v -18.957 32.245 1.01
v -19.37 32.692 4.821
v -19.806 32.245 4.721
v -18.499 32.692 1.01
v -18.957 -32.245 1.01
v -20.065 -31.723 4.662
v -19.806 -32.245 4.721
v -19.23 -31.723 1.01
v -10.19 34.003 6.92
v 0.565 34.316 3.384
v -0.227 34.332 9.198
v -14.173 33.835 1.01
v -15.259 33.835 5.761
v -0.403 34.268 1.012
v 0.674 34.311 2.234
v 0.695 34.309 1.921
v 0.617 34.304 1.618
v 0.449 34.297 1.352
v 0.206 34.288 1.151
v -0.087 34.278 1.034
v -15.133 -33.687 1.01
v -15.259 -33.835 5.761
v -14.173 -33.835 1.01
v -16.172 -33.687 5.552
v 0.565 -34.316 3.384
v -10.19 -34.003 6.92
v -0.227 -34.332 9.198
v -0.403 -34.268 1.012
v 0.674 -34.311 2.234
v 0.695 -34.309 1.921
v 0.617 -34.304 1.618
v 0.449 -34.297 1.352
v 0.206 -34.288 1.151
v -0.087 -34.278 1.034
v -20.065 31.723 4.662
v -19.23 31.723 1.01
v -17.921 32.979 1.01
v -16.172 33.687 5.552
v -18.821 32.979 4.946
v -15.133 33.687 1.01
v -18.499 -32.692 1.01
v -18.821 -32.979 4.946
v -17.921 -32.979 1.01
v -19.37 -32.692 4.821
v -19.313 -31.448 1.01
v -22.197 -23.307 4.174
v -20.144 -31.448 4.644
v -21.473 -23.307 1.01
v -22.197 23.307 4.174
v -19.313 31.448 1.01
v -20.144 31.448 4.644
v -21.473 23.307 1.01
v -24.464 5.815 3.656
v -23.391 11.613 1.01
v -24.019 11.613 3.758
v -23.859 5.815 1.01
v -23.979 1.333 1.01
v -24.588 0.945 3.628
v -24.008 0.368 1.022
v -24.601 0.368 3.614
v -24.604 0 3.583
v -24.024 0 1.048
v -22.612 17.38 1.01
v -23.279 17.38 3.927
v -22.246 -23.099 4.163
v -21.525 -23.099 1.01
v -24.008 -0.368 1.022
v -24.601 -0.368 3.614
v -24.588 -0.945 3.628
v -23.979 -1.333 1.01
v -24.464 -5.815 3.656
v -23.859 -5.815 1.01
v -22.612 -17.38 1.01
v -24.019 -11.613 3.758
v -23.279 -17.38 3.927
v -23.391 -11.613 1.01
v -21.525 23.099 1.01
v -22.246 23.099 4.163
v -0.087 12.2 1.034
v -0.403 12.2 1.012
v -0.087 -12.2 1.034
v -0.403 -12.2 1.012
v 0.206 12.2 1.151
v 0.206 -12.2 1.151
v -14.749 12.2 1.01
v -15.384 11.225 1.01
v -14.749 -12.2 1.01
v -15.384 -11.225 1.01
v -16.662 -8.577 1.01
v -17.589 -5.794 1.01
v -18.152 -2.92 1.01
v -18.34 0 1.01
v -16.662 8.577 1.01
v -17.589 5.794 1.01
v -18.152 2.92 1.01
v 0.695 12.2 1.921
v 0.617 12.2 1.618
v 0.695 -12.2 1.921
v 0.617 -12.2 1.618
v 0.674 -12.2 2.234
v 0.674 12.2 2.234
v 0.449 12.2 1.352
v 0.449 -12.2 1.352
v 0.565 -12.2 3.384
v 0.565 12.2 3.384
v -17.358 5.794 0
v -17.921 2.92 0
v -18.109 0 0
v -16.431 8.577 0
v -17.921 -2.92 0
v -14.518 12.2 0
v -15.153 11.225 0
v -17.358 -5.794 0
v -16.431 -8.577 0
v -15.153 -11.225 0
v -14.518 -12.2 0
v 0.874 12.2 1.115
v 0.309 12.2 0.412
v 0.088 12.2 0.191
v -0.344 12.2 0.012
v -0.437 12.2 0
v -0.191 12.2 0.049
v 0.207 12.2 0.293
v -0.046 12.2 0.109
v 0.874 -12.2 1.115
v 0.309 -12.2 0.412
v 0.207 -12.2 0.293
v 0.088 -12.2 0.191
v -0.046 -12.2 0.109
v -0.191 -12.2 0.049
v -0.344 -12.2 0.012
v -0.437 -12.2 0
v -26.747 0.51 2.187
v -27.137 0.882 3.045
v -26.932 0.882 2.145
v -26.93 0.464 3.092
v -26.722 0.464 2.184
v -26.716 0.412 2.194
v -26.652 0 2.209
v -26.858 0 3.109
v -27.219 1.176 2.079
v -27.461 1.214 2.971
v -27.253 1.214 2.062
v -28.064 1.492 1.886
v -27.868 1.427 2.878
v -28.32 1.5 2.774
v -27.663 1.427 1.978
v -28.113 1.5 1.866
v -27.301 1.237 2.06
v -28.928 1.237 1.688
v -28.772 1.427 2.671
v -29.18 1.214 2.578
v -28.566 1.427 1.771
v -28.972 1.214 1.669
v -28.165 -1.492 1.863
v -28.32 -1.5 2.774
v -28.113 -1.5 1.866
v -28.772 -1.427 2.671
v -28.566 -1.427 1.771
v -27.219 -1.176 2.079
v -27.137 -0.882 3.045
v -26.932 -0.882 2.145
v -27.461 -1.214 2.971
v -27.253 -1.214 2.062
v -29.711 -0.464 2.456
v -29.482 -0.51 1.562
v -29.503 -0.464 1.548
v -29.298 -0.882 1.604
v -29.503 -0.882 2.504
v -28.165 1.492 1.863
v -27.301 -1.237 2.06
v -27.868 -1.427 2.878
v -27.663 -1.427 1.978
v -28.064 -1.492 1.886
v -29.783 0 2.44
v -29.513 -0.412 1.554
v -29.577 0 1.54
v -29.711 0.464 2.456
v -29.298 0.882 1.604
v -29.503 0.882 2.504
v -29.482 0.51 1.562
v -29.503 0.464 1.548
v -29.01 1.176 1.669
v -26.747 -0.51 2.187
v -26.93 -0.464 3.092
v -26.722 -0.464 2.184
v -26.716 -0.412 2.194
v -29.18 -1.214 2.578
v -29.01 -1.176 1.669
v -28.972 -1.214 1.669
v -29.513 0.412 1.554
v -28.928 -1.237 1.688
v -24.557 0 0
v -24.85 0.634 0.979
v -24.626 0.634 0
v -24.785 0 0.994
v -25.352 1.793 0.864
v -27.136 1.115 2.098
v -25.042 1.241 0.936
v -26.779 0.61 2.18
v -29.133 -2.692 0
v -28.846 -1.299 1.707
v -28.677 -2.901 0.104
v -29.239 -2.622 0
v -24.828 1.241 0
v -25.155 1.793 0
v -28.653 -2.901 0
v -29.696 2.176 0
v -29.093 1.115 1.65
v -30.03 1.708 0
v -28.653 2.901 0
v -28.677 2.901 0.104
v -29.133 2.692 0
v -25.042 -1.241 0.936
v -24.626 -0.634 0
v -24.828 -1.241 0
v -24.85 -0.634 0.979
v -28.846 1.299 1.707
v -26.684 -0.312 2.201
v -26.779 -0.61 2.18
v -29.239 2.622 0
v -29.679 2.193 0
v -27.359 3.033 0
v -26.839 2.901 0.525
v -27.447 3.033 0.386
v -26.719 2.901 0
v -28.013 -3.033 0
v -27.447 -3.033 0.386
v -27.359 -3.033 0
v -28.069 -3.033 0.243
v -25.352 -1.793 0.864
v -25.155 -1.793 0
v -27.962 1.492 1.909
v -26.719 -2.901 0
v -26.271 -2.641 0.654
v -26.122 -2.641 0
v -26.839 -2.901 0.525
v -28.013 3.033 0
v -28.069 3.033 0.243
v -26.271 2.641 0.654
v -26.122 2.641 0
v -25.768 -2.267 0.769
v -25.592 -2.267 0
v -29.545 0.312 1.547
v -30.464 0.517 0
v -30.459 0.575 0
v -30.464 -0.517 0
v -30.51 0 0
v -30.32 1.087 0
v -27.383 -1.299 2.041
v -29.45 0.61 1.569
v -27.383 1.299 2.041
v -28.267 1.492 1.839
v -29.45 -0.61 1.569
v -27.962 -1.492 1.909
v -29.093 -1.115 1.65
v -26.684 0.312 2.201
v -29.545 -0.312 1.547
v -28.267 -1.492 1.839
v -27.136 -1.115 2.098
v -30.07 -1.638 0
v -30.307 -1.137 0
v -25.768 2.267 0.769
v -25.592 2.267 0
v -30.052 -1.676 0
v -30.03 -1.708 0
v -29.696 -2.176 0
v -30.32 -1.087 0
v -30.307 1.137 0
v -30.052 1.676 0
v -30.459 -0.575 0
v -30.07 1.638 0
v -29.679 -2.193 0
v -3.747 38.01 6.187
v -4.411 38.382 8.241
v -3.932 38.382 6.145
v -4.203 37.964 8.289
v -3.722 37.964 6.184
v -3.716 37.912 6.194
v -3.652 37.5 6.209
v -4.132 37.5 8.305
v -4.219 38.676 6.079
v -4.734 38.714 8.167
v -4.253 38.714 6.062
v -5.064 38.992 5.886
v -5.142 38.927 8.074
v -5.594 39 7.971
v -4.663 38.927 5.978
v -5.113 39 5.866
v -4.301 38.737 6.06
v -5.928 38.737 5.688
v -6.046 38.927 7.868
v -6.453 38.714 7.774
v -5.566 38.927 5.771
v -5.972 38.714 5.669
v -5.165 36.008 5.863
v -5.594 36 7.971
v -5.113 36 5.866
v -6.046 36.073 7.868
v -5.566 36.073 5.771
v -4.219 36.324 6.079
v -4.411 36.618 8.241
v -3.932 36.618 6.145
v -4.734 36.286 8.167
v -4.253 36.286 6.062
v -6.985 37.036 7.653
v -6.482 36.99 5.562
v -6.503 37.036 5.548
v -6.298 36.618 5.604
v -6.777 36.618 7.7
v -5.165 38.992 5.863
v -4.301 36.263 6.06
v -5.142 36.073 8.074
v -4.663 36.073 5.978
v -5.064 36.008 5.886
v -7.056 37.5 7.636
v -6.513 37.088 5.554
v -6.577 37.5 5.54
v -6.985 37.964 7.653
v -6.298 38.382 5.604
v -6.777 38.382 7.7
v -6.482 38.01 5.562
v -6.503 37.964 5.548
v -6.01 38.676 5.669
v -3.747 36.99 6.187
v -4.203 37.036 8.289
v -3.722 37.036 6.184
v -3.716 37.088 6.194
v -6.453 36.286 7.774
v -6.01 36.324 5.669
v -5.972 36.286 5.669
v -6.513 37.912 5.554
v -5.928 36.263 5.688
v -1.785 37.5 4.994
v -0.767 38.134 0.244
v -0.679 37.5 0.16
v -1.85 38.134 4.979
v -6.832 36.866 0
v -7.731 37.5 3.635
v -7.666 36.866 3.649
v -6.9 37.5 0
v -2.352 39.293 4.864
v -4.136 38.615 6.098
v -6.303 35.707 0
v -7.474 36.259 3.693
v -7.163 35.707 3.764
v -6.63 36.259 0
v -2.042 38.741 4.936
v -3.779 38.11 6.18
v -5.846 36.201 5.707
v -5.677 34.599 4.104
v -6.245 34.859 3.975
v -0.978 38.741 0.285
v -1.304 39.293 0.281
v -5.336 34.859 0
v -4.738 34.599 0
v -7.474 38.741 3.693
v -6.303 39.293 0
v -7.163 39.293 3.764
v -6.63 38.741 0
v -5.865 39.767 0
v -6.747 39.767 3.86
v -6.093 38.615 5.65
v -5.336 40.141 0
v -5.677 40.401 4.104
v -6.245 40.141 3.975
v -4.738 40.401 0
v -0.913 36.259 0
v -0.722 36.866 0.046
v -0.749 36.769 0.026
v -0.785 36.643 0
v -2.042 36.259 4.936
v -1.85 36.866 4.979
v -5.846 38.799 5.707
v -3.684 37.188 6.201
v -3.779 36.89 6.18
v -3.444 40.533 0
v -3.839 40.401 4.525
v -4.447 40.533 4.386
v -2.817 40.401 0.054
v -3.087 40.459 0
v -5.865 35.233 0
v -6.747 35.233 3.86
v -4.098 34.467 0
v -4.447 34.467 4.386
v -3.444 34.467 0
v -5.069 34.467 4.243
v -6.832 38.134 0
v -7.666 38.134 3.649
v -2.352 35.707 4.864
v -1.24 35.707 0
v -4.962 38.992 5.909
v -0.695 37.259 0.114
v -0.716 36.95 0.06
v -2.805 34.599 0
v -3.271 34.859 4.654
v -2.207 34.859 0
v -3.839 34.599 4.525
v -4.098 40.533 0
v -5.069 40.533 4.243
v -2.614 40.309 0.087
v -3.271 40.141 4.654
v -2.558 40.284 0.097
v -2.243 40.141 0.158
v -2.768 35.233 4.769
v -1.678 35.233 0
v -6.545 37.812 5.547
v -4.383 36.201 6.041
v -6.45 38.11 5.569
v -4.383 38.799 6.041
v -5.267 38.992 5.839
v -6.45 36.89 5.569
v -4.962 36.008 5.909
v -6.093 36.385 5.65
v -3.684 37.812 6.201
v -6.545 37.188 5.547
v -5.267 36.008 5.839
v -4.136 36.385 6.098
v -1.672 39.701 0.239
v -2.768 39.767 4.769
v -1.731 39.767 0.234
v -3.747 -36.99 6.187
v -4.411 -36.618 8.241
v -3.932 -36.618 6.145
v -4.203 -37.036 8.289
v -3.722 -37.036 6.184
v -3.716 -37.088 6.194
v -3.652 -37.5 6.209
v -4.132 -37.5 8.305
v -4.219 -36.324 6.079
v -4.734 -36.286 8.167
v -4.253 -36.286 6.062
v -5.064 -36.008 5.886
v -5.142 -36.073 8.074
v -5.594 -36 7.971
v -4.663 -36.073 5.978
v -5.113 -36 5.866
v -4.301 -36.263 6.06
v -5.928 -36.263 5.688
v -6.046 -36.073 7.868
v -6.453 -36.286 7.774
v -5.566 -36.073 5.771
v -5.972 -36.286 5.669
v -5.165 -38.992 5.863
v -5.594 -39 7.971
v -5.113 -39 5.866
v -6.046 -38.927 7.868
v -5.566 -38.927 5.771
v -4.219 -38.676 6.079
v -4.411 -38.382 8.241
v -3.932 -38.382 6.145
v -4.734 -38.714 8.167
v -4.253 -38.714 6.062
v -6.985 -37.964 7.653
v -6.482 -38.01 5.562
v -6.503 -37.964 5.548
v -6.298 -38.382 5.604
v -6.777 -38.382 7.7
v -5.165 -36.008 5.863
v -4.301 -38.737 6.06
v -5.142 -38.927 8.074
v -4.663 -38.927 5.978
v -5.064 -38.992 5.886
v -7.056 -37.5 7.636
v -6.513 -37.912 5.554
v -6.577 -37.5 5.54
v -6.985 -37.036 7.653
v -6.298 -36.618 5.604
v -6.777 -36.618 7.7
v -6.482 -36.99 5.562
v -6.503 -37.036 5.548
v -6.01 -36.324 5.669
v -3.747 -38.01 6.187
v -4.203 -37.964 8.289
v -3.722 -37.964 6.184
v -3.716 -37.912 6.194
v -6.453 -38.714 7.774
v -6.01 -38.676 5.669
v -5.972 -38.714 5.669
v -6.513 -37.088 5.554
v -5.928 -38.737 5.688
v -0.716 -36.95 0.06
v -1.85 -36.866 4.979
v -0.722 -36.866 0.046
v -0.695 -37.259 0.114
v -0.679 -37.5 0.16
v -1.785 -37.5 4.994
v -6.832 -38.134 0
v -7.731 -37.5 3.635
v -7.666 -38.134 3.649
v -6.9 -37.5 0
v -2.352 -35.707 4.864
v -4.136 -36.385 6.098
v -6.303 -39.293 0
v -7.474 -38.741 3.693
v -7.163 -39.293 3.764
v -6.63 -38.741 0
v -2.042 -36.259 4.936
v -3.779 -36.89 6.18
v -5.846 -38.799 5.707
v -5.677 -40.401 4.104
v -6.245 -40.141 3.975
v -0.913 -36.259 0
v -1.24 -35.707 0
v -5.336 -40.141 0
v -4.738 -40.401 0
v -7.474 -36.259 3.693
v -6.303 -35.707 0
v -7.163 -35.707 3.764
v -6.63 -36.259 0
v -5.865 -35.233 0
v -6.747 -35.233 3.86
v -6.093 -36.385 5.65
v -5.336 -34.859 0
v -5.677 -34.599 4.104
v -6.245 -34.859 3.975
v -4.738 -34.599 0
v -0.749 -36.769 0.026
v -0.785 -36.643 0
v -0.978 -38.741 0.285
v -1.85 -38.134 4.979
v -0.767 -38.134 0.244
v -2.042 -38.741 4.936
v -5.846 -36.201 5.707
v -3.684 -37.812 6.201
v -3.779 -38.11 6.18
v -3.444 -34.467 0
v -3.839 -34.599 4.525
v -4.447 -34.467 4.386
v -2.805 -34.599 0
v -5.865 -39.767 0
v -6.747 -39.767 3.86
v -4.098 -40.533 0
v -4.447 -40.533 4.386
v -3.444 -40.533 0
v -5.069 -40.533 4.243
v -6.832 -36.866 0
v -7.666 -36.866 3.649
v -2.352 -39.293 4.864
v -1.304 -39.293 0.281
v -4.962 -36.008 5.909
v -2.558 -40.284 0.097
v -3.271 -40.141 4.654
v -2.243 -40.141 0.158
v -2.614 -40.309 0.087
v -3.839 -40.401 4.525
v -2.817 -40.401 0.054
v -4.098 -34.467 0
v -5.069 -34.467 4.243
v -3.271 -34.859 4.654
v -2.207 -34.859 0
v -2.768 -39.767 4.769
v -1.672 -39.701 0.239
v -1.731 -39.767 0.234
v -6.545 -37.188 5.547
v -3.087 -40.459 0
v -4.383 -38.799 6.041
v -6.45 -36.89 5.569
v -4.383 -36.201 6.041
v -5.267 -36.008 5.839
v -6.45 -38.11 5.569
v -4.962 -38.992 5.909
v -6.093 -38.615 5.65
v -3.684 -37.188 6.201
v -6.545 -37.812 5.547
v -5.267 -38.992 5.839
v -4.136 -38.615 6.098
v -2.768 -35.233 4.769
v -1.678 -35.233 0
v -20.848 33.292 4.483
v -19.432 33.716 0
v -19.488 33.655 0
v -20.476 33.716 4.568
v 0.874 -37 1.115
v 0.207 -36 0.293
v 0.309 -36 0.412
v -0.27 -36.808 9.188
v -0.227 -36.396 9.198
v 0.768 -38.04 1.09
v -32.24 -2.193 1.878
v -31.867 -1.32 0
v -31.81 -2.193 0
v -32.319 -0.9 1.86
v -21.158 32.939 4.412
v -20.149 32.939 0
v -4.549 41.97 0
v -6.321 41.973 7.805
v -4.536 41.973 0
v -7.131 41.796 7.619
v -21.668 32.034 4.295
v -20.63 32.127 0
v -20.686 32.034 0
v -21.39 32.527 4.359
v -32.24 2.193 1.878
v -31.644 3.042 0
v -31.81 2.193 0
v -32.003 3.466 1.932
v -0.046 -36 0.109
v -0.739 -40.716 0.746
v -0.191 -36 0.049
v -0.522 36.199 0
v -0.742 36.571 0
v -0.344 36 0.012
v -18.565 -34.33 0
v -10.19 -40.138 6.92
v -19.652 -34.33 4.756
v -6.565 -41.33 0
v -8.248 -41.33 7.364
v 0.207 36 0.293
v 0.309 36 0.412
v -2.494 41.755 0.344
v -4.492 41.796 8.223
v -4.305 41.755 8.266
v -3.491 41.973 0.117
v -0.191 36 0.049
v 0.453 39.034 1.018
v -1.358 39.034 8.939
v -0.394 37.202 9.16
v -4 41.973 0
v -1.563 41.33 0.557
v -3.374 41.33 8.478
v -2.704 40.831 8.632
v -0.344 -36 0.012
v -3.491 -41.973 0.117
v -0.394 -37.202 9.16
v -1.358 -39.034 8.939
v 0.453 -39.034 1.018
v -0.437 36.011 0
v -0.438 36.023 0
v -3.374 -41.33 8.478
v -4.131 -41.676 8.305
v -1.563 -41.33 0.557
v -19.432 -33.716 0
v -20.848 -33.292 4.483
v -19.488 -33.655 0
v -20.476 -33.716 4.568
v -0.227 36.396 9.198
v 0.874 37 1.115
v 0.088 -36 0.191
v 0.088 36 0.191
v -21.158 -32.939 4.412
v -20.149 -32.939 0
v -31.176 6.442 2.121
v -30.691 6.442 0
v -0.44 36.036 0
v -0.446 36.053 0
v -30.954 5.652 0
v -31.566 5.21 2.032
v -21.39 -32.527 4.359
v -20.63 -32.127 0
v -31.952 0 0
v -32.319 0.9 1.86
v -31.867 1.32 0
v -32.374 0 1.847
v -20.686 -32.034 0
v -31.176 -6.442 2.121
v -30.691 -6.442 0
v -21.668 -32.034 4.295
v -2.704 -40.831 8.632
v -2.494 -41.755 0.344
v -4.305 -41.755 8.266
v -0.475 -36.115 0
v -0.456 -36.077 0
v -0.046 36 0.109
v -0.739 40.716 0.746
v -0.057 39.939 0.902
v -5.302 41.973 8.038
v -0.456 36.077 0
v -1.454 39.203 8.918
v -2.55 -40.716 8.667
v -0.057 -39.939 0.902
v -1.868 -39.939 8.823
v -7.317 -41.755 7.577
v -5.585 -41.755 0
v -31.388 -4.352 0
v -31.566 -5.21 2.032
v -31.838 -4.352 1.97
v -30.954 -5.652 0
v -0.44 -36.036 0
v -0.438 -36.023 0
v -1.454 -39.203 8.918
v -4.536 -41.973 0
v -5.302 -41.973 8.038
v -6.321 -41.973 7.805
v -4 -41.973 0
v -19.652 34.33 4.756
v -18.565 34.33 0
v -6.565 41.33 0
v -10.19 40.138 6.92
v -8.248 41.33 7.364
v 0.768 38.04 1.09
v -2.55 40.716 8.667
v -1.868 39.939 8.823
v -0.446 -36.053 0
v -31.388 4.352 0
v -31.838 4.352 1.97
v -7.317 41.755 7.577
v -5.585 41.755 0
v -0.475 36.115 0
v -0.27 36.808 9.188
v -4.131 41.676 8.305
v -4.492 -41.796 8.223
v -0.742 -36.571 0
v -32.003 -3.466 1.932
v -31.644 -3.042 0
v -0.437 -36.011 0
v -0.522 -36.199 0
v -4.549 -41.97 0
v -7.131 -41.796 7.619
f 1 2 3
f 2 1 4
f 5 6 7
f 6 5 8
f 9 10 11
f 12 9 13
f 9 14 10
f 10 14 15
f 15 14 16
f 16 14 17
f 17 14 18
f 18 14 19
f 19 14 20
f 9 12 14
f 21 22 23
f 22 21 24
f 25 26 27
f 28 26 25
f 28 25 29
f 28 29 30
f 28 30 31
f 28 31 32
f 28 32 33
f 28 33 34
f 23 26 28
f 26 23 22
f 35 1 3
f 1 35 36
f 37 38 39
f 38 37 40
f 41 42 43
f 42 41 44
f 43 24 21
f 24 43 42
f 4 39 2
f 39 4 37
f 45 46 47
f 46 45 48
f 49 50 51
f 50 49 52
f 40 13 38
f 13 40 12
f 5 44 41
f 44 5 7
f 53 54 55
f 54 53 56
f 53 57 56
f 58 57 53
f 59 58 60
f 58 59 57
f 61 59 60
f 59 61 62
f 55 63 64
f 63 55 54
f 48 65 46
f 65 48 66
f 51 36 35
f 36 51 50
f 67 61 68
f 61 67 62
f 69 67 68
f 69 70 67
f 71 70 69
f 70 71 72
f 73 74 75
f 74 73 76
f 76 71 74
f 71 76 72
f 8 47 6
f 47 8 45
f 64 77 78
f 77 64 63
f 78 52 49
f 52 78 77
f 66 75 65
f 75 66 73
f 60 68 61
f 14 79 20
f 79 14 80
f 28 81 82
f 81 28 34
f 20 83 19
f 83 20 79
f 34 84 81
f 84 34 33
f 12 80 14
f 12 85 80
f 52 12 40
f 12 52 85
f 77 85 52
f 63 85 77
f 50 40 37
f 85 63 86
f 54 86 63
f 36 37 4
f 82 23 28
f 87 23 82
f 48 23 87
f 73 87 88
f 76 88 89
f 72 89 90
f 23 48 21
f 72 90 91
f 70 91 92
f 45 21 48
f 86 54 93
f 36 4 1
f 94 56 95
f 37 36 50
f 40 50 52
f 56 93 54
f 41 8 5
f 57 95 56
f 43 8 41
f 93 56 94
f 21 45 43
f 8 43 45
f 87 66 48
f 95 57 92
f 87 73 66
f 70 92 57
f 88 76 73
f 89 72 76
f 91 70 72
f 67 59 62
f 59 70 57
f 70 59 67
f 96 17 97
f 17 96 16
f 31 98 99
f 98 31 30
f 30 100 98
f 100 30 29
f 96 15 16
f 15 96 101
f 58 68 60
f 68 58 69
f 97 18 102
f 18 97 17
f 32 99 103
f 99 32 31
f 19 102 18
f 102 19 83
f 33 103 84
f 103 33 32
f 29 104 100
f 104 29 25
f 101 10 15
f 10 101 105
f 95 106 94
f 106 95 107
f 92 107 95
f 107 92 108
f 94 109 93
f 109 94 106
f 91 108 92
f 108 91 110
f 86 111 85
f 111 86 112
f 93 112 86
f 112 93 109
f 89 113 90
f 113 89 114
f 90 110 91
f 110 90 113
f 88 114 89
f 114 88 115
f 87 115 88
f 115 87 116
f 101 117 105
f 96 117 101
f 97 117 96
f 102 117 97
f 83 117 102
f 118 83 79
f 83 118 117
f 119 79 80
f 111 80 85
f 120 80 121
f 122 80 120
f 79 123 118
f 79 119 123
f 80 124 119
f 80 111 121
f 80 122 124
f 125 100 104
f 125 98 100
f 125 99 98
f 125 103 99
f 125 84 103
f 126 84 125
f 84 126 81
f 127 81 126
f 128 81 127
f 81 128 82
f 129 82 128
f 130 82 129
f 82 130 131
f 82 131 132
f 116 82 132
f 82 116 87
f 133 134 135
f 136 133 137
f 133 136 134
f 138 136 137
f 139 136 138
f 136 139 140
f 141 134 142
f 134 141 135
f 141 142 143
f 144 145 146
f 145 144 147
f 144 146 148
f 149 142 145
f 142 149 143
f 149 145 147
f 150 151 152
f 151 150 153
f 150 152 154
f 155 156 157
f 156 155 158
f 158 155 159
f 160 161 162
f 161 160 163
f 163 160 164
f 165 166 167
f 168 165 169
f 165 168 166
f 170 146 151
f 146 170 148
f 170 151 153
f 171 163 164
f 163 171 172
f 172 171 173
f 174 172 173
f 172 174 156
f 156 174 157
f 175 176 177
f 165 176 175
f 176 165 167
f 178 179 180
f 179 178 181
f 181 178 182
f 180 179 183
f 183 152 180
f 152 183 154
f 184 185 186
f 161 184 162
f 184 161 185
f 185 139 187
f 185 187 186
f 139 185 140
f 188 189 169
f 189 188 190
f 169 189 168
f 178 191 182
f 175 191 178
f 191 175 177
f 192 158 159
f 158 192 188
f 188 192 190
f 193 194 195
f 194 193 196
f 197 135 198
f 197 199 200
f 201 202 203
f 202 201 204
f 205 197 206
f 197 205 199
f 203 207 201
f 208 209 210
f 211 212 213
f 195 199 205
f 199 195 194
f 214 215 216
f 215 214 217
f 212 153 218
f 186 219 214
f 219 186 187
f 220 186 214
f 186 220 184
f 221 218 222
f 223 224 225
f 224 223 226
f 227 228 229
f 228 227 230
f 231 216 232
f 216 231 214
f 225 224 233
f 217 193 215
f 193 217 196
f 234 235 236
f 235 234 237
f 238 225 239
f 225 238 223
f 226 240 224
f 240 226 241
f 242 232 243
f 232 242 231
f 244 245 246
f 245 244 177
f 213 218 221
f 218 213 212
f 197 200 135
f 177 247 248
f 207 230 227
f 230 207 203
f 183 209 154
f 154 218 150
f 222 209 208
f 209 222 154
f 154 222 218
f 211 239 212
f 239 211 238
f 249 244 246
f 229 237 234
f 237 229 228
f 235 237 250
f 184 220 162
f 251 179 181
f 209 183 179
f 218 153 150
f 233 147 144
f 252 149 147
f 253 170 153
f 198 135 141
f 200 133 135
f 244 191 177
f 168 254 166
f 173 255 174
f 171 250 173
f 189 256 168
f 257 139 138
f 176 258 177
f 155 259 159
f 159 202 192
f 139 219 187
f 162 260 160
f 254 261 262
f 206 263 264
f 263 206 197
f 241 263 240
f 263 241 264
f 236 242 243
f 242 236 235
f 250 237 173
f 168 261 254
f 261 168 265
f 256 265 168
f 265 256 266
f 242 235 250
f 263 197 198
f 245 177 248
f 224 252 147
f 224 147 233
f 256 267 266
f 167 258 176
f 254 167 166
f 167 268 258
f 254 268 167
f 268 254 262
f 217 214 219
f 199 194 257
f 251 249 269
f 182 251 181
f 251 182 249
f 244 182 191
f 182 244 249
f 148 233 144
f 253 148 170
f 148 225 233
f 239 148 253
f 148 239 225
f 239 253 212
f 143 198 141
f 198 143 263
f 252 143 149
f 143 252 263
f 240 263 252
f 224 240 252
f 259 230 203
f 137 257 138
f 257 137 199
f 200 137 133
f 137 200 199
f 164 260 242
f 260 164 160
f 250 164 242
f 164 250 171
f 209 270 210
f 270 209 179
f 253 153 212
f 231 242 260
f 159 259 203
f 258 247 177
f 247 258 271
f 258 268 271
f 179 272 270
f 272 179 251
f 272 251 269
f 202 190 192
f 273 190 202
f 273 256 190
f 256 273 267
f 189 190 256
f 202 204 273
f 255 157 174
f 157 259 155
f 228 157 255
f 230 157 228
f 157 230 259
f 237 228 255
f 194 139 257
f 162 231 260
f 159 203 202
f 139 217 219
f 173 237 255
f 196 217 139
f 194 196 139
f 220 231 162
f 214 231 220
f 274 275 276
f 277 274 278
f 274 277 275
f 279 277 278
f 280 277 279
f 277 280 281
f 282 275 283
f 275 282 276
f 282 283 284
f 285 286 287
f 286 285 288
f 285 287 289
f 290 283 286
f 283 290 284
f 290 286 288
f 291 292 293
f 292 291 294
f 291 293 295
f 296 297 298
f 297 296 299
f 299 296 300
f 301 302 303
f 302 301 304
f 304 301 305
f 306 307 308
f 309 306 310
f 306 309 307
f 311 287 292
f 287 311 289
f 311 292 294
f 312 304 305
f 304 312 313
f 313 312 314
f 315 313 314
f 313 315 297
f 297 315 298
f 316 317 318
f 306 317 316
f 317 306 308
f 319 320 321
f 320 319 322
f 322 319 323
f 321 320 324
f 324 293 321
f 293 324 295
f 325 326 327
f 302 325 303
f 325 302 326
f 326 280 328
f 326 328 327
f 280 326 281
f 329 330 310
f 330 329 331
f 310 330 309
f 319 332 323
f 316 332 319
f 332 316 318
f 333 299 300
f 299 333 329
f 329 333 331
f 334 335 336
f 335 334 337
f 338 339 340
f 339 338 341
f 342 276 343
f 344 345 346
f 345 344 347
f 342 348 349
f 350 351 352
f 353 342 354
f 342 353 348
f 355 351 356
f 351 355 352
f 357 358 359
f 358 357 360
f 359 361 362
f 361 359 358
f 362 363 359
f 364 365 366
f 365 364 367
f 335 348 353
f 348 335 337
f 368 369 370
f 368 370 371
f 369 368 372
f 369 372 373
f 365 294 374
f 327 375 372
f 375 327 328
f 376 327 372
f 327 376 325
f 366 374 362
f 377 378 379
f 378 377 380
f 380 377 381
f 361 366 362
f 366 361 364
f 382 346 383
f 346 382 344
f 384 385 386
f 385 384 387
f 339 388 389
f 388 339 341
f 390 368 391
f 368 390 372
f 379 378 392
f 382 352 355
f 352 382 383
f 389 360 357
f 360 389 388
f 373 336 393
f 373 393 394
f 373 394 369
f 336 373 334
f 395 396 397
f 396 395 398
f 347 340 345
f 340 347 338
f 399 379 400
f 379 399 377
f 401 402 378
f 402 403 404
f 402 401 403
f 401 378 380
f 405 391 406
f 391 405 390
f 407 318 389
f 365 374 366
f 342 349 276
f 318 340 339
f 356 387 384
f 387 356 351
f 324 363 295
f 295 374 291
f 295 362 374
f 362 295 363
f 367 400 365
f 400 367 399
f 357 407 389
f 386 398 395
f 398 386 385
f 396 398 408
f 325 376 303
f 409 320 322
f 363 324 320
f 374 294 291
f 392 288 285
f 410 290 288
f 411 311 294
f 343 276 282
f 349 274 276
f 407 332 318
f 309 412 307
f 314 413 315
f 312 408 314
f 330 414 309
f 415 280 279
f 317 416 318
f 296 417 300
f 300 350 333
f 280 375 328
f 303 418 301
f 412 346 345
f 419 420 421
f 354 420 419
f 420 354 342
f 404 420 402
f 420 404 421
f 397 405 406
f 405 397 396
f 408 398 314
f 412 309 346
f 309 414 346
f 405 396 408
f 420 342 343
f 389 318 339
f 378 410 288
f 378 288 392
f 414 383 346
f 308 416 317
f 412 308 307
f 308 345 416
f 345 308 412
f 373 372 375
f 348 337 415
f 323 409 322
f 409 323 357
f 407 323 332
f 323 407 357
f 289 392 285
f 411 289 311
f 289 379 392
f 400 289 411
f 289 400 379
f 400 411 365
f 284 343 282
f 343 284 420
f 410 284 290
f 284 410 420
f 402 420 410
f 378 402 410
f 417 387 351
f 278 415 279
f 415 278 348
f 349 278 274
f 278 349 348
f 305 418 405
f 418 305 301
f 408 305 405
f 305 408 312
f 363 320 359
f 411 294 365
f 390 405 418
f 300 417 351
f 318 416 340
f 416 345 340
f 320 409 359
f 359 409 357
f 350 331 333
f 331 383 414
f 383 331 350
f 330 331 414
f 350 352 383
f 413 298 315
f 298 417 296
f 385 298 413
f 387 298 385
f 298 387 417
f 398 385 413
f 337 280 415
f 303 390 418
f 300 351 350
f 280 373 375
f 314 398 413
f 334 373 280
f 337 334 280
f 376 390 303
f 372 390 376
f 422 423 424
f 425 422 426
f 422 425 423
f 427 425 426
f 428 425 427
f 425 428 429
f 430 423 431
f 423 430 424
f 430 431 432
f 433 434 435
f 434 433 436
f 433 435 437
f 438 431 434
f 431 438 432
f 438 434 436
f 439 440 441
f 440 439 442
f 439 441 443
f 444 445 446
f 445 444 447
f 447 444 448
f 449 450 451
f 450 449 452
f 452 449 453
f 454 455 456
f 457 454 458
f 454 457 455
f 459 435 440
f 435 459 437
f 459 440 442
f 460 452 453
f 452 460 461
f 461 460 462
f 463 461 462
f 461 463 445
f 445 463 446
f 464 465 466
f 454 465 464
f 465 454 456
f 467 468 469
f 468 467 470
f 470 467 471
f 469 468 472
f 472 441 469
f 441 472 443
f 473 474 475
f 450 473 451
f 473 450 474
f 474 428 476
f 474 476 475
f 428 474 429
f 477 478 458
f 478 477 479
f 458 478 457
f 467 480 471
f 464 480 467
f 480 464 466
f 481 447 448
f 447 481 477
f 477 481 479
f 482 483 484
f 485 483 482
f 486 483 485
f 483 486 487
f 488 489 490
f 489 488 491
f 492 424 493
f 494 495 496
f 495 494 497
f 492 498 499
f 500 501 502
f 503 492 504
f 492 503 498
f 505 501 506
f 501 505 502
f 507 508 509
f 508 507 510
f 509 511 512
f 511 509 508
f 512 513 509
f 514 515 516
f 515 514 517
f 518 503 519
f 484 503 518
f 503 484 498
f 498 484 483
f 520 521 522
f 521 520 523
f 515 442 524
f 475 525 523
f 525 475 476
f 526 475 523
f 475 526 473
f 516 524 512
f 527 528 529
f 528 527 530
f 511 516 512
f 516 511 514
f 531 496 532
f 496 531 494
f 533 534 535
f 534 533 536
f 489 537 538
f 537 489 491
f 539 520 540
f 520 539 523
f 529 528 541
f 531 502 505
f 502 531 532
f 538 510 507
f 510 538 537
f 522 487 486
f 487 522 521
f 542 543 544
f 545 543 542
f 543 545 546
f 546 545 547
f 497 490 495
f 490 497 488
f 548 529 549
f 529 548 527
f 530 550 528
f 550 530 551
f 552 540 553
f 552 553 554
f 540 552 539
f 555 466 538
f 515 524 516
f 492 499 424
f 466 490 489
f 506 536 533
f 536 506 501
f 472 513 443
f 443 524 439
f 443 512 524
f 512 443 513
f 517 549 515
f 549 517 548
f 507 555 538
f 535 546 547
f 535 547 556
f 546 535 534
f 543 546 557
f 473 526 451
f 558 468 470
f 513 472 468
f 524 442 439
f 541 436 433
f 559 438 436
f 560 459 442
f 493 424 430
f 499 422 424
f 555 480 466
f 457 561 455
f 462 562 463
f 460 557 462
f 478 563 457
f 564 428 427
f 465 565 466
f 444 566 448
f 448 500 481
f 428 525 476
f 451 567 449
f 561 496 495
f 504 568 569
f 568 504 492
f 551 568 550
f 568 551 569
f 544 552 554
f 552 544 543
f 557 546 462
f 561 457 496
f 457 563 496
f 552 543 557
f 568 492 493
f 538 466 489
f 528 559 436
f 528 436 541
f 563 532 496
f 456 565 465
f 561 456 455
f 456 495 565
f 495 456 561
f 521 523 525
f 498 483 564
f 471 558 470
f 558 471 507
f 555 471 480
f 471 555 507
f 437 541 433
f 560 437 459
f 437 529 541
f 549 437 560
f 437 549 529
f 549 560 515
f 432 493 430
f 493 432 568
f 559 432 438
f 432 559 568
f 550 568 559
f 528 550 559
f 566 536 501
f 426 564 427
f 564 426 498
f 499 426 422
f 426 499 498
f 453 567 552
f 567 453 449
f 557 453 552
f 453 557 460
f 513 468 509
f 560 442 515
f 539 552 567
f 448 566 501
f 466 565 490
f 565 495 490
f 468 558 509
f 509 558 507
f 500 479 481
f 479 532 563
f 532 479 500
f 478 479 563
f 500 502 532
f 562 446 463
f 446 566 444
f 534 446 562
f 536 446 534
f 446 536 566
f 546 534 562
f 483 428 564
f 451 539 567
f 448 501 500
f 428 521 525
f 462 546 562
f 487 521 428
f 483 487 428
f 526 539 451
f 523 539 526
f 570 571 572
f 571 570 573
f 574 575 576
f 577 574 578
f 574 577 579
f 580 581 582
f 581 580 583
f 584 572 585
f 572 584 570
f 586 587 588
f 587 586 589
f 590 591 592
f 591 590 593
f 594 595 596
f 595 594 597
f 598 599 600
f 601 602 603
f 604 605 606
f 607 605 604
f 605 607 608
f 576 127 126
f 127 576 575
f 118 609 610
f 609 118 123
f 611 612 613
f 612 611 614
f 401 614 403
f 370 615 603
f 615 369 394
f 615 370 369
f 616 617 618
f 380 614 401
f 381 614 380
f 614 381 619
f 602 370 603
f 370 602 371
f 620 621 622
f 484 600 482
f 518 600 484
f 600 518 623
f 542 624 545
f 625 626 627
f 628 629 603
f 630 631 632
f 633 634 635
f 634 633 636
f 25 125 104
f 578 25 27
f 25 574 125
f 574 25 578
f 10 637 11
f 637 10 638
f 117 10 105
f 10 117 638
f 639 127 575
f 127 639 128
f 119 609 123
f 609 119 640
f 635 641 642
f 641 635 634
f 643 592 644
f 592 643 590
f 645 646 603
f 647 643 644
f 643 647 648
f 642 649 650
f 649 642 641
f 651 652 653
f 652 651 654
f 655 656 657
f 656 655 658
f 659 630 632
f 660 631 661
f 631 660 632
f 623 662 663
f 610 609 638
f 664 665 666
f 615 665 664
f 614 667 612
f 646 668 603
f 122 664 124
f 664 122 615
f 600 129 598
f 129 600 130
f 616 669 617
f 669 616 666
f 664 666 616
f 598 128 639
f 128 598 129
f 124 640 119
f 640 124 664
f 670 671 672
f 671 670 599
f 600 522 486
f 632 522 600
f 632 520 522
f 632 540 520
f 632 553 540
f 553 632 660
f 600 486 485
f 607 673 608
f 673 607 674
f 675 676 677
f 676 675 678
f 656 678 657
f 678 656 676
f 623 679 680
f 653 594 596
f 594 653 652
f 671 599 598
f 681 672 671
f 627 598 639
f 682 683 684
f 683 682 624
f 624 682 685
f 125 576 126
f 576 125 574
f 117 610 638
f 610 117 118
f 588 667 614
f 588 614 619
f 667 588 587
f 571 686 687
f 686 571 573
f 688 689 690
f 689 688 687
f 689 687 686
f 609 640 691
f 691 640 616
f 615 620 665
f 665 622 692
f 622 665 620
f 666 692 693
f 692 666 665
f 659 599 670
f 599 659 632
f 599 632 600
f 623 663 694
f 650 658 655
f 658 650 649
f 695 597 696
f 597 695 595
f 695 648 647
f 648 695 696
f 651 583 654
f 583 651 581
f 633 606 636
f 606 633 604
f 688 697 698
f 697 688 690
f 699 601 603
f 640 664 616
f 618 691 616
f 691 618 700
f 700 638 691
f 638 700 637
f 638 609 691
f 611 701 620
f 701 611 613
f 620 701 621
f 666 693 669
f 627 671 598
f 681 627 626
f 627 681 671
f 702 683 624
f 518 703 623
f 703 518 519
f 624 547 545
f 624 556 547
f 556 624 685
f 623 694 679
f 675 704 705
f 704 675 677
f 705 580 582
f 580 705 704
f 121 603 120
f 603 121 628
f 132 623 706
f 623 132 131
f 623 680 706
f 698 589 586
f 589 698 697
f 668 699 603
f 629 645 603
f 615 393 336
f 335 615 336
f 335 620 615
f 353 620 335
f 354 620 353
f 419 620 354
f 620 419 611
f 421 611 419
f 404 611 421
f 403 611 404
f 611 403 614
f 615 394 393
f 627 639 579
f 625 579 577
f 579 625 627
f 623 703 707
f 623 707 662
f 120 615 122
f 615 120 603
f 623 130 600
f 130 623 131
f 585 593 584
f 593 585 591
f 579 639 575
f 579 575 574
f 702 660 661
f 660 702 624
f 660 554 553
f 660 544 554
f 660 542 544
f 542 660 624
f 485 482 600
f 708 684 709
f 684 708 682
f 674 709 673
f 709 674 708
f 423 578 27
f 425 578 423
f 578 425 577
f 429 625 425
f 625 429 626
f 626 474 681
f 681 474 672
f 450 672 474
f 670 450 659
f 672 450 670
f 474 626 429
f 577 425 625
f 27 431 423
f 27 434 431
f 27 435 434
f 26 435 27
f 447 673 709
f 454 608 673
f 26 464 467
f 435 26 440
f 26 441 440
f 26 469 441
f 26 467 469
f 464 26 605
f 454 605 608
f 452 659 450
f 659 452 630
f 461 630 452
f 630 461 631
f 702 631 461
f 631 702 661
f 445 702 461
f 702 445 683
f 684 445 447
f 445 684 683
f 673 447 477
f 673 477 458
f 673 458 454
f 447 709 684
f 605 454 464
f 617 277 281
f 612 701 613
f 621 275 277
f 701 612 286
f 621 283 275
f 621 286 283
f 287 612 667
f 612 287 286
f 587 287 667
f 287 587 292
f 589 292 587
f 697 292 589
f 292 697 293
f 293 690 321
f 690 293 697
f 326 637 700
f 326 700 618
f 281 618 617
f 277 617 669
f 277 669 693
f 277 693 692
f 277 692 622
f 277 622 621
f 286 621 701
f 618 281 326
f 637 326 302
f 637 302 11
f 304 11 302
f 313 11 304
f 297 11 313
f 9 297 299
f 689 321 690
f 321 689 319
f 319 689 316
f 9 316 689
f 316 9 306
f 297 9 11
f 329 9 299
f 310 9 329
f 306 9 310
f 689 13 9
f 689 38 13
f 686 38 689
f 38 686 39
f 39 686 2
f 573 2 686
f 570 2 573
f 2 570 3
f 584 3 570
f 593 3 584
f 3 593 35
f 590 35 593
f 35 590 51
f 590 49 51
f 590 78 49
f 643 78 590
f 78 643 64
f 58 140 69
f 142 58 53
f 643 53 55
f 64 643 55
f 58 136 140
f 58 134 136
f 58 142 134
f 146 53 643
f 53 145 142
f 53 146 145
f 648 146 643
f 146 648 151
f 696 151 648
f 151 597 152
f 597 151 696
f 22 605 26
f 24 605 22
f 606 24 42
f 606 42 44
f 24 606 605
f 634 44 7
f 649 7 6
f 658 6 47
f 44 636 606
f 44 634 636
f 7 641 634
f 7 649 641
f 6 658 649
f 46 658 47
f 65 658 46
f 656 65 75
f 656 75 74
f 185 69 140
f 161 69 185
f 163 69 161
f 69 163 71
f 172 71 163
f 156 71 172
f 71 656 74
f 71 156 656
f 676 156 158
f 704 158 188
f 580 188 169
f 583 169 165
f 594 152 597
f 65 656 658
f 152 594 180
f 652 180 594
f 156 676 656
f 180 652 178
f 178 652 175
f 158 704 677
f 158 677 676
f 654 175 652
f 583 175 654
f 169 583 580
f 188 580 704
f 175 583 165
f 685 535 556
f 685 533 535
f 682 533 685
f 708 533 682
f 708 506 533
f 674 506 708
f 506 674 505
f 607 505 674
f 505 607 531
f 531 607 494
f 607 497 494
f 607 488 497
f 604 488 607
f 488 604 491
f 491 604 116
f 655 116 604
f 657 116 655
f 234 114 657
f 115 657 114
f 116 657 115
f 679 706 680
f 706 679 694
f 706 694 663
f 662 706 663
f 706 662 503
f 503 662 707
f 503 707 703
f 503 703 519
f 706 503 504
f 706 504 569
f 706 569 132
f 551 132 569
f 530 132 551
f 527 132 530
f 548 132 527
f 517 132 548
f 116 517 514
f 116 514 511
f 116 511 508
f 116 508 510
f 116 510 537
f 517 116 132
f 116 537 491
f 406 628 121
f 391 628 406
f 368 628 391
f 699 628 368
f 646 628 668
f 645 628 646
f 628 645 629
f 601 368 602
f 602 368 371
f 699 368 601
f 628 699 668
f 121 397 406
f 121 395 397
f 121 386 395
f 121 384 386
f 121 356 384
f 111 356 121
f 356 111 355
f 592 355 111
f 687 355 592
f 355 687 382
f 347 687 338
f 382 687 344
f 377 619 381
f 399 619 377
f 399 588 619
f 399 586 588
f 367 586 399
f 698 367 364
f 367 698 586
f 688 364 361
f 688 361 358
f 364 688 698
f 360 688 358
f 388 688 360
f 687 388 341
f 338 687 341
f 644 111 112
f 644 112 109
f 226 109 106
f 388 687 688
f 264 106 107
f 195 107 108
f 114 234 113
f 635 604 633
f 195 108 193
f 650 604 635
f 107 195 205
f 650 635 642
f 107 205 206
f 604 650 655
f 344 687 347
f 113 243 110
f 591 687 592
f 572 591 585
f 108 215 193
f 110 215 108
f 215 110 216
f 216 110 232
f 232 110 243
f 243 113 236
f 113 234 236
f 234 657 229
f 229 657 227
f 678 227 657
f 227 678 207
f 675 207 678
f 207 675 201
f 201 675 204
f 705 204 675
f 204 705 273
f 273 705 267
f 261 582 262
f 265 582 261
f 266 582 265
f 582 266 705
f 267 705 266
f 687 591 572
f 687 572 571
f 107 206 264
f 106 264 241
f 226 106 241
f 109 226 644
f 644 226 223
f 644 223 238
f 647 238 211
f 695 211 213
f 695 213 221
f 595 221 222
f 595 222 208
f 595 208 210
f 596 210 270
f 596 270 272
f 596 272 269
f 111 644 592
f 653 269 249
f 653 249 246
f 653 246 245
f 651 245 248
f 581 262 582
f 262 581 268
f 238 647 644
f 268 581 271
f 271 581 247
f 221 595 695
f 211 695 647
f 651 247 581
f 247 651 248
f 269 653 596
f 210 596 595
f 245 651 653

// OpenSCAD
// file: ../Dollo/NEW_long_ties/globals.scad
/*
Most things in this file is represented as one millimeter, so keep that in mind while changing things.
Some of the setting are not mm but at variables that you can set, such as 2*x=2x and you are setting what x is.
I will try to specify when things are variables and not exact measurements.
*/

// printer slop
slop = 0.15;

obj_leg = 30;
leg_length = 5.5;
small_number = 0.001;
metal_core_rode_global = 5;


///////////////// number of holes /////////////////////
z_hole_number = 8;
other_holes = 8;

///////////////// Pins /////////////////////

//pins that poke out
ball_size = 10;
pin_height = 20;
pin_diameter = 6;


//holes
hole_ball_size = ball_size;
hole_pin_height = pin_height;
hole_pin_diameter = pin_diameter;

///////////////// Z THINGS /////////////////////

berring_slot_width = 7.5;
berring_slot_depth = 6.5;
metal_core_rode = 5;

///////////////// X THINGS /////////////////////

//male dove tails
male_dove_max_width=8;
male_dove_min_width=5;
male_dove_depth=5;
male_dove_height=obj_leg/2;

function scaled_male_dove_max_width() = male_dove_max_width - slop;
function scaled_male_dove_min_width() = male_dove_min_width - slop;
function scaled_male_dove_depth() = male_dove_depth - slop;

//female dove tails, this is found on the y mounts
girl_max_width=11;
girl_min_width=5;
girl_depth=5;
girl_height=obj_leg;


///////////////// Y THINGS /////////////////////
/*
The Y is so normal that all of those global variables at the top should change all of the setting in it, this section is set her incase there are variables set in the future development of this project.
*/

// stepper
motor_side_length = 43.2;
motor_bolt_hole_distance = 31;
motor_center_hole = 23;
motor_shaft_dia = 5;
motor_shaft_hole_dia = 5+2*slop;

// bolts etc.
bolt_hole_dia = 3+2*slop;
bolt_head_hole_dia = 5.8;

m4_bolt_hole_dia = 4+2*slop;
m4_bolt_head_hole_dia = 6.8+2*slop;


m3_nut_side = 5.65;
m3_nut_height = 2.3;
m4_nut_side = 6.85;
m4_nut_height = 3.1;

// threaded rod
lifter_rod_diam = 9.86;
hole_threaded_rod = lifter_rod_diam+2*slop;

// for the extensions
metal_rod_size = 9;
// main file
use <../Dollo/NEW_long_ties/include.scad>;


//_mock_hinge();


//hinge_clamp_1();
hinge_clamp_2();


module _mock_hinge() {
    difference() {
        union() {
            intersection() {
                hull() {
                    translate([0, 68/2 - 1/2, 0])
                    cylinder(d=1, h=20, $fn=20);

                    translate([0, -68/2 + 1/2, 0])
                    cylinder(d=1, h=20, $fn=20);

                    translate([28, 0, 0])
                    cylinder(d=1, h=20, $fn=20);

                    translate([
                        20.5 - 4/2, -65.5/2 + 4/2, 0
                    ])
                    cylinder(d=4, h=20, $fn=20);

                    translate([
                         20.5 - 4/2, 65.5/2 - 4/2, 0
                    ])
                    cylinder(d=4, h=20, $fn=20);

                    translate([
                        18.5 - 6/2, -67/2 + 6/2, 0
                    ])
                    cylinder(d=6, h=20, $fn=20);

                    translate([
                        18.5 - 6/2, 67/2 - 6/2, 0
                    ])
                    cylinder(d=6, h=20, $fn=20);
                }

                translate([-220/2 + 25, 0, 0])
                cylinder(d=220, h=30, $fn=120);

                hull() {
                    translate([0.1/2, 0, 0.1/2])
                    rotate([90, 0, 0])
                    cylinder(
                        d=0.1, h=70, center=true, $fn=10
                    );

                    translate([2/2 + 0.9, 0, 8 - 2/2])
                    rotate([90, 0, 0])
                    cylinder(
                        d=2, h=70, center=true, $fn=20
                    );

                    translate([
                        25 - 0.1/2, 0, 2.7 - 0.1/2
                    ])
                    rotate([90, 0, 0])
                    cylinder(
                        d=0.1, h=70, center=true, $fn=10
                    );

                    translate([25 - 0.1/2, 0, 0.1/2])
                    rotate([90, 0, 0])
                    cylinder(
                        d=0.1, h=70, center=true, $fn=10
                    );
                }
            }
            translate([25 - 35/2 - 6, 0, -10])
            cylinder(d=35, h=10, $fn=30);
        }

        intersection() {
            translate([25 - 45/2 - 6.5, 0, 0])
            cylinder(d=45, h=20, $fn=50);

            cube([60, 24, 40], center=true);
        }

        intersection() {
            translate([25 - 45/2 - 6, 0, 0])
            cylinder(d=45, h=20, $fn=50);

            cube([60, 24, 40], center=true);
        }
    }
}

module screw_hole() {
    cylinder(d=3, h=30, center=true, $fn=20);

    hull() {
        translate([0, 0, -30])
        cylinder(d=3, h=35, $fn=30);

        translate([0, 0, -30])
        cylinder(d=6.1, h=33.4, $fn=30);
    }
}

module hinge_clamp() {

    intersection() {
        difference() {
            hull() {
                translate([-14, 0, 0])
                rotate([0, -12.88, 0])
                cylinder(d=35, h=10, $fn=50);

                translate([2, 0, 5/2])
                rotate([90, 0, 0])
                cylinder(d=5, h=72, center=true, $fn=40);

                translate([8, 0, 12.5])
                cube([0.1, 72, 4], center=true);

                translate([-16, 30])
                rotate([0, -12.88, 0])
                cylinder(d=10, h=10, $fn=30);

                translate([-16, -30])
                rotate([0, -12.88, 0])
                cylinder(d=10, h=10, $fn=30);
            }

            translate([0, 0, 10.25])
            rotate([0, -12.88, 0])
            cylinder(d=200, h=30);

            translate([0, 0, 8.26 + 2])
            rotate([0, 167.12, 0])
            scale([1.01, 1.01, 1])
            _mock_hinge();

            translate([0, 0, 8.63 + 2])
            rotate([0, 167.12, 0])
            intersection() {
                translate([25 - 45/2 - 6, 0, 0])
                cylinder(
                    d=46.6, h=60, center=true, $fn=50
                );

                cube([60, 24.4, 60], center=true);
            }

            translate([-27, 0, -3])
            rotate([0, -12.88, 0])
            screw_hole();

            translate([5.5, 25, 5.3])
            rotate([0, -12.88, 0])
            screw_hole();

            translate([5.5, -25, 5.3])
            rotate([0, -12.88, 0])
            screw_hole();
        }

        cylinder(d=300, h=40);
    }

    %translate([-0.1, 0, 8.26 + 2])
    rotate([0, 167.12, 0])
    _mock_hinge();
}

module hinge_clamp_2() {

    intersection() {
        difference() {
            hull() {
                translate([-14, 0, 0])
                rotate([0, -12.88, 0])
                intersection() {
                    cylinder(d=35, h=10, $fn=50);

                    translate([-20, 0, 0])
                    cube([40, 40, 20], center=true);
                }

                translate([-0.5, 0, 2/2])
                rotate([90, 0, 0])
                cylinder(d=2, h=72, center=true, $fn=40);

                translate([-1, 0, 12.5])
                cube([0.1, 72, 4], center=true);

                translate([-16, 30])
                rotate([0, -12.88, 0])
                cylinder(d=10, h=10, $fn=30);

                translate([-16, -30])
                rotate([0, -12.88, 0])
                cylinder(d=10, h=10, $fn=30);

                translate([-4, 37])
                rotate([0, -12.88, 0])
                cylinder(d=10, h=10, $fn=30);

                translate([-4, -37])
                rotate([0, -12.88, 0])
                cylinder(d=10, h=10, $fn=30);
            }

            translate([0, 0, 9.25])
            rotate([0, -12.88, 0])
            cylinder(d=200, h=30);

            translate([0, 0, 8.26 + 1])
            rotate([0, 167.12, 0])
            scale([1.01, 1.01, 1])
            _mock_hinge();

            translate([0, 0, 8.63 + 1])
            rotate([0, 167.12, 0])
            intersection() {
                translate([25 - 45/2 - 6, 0, 0])
                cylinder(
                    d=46.6, h=60, center=true, $fn=50
                );

                cube([60, 24.4, 60], center=true);
            }

            translate([-27, 0, -3])
            rotate([0, -12.88, 0])
            screw_hole();

            translate([-4, 37.5, 1])
            rotate([0, -12.88, 0])
            screw_hole();

            translate([-4, -37.5, 1])
            rotate([0, -12.88, 0])
            screw_hole();
        }

        cylinder(d=300, h=40);
    }

    %translate([-0.1, 0, 8.26 + 1])
    rotate([0, 167.12, 0])
    _mock_hinge();
}
